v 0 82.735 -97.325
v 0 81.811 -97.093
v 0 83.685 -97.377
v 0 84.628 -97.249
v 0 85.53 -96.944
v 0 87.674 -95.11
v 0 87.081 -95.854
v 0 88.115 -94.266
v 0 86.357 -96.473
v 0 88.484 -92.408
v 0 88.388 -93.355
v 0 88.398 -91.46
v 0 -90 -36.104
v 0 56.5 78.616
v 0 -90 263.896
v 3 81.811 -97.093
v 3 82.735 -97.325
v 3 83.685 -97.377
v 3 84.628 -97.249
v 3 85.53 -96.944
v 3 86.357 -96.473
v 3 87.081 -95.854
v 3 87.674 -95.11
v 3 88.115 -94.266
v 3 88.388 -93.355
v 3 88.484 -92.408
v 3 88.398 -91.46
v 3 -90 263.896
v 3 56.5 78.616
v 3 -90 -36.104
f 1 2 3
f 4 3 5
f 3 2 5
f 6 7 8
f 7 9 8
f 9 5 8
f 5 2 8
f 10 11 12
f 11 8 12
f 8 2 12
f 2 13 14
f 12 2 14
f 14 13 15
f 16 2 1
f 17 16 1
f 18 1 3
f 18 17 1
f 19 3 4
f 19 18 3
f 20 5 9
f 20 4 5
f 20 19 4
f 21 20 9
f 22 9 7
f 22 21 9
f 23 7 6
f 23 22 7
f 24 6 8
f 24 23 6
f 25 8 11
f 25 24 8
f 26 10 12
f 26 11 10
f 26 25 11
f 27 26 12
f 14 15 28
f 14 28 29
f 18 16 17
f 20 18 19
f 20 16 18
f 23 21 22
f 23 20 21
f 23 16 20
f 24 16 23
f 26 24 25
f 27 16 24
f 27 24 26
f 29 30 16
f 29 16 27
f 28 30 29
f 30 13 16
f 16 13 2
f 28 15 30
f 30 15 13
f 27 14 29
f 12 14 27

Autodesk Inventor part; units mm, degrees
ref_plane "YZ Plane" through (0, 0, 0) normal (1, 0, 0) x (0, 1, 0)
ref_plane "XZ Plane" through (0, 0, 0) normal (0, 1, 0) x (-1, 0, 0)
ref_plane "XY Plane" through (0, 0, 0) normal (0, 0, 1) x (1, 0, 0)
sketch "スケッチ1" plane through (0, 0, 0) normal (1, 0, 0) x (0, 1, 0)
  line L0 (-90, 263.8963) -> (-90, -36.1037)
  line L1 (-90, -36.1037) -> (90, -100)
  line L2 (-126, 0) -> (126, 0) projected
  line L3 (0, -172.7793) -> (0, 336.6756) projected
  line L4 (-90, 263.8963) -> (56.4999, 78.6159)
  line L5 (56.4999, 78.6159) -> (90, -100)
  dimension "d0" = 300
  dimension "d5" = 90
  dimension "d6" = 100
  dimension "d7" = 90
extrude "押し出し1" add sketch "スケッチ1" along normal blind 3
fillet "フィレット1" radius 5 1 edges at (1.5, 90, -100)
properties part number "stay_middle" material "CFRP"
